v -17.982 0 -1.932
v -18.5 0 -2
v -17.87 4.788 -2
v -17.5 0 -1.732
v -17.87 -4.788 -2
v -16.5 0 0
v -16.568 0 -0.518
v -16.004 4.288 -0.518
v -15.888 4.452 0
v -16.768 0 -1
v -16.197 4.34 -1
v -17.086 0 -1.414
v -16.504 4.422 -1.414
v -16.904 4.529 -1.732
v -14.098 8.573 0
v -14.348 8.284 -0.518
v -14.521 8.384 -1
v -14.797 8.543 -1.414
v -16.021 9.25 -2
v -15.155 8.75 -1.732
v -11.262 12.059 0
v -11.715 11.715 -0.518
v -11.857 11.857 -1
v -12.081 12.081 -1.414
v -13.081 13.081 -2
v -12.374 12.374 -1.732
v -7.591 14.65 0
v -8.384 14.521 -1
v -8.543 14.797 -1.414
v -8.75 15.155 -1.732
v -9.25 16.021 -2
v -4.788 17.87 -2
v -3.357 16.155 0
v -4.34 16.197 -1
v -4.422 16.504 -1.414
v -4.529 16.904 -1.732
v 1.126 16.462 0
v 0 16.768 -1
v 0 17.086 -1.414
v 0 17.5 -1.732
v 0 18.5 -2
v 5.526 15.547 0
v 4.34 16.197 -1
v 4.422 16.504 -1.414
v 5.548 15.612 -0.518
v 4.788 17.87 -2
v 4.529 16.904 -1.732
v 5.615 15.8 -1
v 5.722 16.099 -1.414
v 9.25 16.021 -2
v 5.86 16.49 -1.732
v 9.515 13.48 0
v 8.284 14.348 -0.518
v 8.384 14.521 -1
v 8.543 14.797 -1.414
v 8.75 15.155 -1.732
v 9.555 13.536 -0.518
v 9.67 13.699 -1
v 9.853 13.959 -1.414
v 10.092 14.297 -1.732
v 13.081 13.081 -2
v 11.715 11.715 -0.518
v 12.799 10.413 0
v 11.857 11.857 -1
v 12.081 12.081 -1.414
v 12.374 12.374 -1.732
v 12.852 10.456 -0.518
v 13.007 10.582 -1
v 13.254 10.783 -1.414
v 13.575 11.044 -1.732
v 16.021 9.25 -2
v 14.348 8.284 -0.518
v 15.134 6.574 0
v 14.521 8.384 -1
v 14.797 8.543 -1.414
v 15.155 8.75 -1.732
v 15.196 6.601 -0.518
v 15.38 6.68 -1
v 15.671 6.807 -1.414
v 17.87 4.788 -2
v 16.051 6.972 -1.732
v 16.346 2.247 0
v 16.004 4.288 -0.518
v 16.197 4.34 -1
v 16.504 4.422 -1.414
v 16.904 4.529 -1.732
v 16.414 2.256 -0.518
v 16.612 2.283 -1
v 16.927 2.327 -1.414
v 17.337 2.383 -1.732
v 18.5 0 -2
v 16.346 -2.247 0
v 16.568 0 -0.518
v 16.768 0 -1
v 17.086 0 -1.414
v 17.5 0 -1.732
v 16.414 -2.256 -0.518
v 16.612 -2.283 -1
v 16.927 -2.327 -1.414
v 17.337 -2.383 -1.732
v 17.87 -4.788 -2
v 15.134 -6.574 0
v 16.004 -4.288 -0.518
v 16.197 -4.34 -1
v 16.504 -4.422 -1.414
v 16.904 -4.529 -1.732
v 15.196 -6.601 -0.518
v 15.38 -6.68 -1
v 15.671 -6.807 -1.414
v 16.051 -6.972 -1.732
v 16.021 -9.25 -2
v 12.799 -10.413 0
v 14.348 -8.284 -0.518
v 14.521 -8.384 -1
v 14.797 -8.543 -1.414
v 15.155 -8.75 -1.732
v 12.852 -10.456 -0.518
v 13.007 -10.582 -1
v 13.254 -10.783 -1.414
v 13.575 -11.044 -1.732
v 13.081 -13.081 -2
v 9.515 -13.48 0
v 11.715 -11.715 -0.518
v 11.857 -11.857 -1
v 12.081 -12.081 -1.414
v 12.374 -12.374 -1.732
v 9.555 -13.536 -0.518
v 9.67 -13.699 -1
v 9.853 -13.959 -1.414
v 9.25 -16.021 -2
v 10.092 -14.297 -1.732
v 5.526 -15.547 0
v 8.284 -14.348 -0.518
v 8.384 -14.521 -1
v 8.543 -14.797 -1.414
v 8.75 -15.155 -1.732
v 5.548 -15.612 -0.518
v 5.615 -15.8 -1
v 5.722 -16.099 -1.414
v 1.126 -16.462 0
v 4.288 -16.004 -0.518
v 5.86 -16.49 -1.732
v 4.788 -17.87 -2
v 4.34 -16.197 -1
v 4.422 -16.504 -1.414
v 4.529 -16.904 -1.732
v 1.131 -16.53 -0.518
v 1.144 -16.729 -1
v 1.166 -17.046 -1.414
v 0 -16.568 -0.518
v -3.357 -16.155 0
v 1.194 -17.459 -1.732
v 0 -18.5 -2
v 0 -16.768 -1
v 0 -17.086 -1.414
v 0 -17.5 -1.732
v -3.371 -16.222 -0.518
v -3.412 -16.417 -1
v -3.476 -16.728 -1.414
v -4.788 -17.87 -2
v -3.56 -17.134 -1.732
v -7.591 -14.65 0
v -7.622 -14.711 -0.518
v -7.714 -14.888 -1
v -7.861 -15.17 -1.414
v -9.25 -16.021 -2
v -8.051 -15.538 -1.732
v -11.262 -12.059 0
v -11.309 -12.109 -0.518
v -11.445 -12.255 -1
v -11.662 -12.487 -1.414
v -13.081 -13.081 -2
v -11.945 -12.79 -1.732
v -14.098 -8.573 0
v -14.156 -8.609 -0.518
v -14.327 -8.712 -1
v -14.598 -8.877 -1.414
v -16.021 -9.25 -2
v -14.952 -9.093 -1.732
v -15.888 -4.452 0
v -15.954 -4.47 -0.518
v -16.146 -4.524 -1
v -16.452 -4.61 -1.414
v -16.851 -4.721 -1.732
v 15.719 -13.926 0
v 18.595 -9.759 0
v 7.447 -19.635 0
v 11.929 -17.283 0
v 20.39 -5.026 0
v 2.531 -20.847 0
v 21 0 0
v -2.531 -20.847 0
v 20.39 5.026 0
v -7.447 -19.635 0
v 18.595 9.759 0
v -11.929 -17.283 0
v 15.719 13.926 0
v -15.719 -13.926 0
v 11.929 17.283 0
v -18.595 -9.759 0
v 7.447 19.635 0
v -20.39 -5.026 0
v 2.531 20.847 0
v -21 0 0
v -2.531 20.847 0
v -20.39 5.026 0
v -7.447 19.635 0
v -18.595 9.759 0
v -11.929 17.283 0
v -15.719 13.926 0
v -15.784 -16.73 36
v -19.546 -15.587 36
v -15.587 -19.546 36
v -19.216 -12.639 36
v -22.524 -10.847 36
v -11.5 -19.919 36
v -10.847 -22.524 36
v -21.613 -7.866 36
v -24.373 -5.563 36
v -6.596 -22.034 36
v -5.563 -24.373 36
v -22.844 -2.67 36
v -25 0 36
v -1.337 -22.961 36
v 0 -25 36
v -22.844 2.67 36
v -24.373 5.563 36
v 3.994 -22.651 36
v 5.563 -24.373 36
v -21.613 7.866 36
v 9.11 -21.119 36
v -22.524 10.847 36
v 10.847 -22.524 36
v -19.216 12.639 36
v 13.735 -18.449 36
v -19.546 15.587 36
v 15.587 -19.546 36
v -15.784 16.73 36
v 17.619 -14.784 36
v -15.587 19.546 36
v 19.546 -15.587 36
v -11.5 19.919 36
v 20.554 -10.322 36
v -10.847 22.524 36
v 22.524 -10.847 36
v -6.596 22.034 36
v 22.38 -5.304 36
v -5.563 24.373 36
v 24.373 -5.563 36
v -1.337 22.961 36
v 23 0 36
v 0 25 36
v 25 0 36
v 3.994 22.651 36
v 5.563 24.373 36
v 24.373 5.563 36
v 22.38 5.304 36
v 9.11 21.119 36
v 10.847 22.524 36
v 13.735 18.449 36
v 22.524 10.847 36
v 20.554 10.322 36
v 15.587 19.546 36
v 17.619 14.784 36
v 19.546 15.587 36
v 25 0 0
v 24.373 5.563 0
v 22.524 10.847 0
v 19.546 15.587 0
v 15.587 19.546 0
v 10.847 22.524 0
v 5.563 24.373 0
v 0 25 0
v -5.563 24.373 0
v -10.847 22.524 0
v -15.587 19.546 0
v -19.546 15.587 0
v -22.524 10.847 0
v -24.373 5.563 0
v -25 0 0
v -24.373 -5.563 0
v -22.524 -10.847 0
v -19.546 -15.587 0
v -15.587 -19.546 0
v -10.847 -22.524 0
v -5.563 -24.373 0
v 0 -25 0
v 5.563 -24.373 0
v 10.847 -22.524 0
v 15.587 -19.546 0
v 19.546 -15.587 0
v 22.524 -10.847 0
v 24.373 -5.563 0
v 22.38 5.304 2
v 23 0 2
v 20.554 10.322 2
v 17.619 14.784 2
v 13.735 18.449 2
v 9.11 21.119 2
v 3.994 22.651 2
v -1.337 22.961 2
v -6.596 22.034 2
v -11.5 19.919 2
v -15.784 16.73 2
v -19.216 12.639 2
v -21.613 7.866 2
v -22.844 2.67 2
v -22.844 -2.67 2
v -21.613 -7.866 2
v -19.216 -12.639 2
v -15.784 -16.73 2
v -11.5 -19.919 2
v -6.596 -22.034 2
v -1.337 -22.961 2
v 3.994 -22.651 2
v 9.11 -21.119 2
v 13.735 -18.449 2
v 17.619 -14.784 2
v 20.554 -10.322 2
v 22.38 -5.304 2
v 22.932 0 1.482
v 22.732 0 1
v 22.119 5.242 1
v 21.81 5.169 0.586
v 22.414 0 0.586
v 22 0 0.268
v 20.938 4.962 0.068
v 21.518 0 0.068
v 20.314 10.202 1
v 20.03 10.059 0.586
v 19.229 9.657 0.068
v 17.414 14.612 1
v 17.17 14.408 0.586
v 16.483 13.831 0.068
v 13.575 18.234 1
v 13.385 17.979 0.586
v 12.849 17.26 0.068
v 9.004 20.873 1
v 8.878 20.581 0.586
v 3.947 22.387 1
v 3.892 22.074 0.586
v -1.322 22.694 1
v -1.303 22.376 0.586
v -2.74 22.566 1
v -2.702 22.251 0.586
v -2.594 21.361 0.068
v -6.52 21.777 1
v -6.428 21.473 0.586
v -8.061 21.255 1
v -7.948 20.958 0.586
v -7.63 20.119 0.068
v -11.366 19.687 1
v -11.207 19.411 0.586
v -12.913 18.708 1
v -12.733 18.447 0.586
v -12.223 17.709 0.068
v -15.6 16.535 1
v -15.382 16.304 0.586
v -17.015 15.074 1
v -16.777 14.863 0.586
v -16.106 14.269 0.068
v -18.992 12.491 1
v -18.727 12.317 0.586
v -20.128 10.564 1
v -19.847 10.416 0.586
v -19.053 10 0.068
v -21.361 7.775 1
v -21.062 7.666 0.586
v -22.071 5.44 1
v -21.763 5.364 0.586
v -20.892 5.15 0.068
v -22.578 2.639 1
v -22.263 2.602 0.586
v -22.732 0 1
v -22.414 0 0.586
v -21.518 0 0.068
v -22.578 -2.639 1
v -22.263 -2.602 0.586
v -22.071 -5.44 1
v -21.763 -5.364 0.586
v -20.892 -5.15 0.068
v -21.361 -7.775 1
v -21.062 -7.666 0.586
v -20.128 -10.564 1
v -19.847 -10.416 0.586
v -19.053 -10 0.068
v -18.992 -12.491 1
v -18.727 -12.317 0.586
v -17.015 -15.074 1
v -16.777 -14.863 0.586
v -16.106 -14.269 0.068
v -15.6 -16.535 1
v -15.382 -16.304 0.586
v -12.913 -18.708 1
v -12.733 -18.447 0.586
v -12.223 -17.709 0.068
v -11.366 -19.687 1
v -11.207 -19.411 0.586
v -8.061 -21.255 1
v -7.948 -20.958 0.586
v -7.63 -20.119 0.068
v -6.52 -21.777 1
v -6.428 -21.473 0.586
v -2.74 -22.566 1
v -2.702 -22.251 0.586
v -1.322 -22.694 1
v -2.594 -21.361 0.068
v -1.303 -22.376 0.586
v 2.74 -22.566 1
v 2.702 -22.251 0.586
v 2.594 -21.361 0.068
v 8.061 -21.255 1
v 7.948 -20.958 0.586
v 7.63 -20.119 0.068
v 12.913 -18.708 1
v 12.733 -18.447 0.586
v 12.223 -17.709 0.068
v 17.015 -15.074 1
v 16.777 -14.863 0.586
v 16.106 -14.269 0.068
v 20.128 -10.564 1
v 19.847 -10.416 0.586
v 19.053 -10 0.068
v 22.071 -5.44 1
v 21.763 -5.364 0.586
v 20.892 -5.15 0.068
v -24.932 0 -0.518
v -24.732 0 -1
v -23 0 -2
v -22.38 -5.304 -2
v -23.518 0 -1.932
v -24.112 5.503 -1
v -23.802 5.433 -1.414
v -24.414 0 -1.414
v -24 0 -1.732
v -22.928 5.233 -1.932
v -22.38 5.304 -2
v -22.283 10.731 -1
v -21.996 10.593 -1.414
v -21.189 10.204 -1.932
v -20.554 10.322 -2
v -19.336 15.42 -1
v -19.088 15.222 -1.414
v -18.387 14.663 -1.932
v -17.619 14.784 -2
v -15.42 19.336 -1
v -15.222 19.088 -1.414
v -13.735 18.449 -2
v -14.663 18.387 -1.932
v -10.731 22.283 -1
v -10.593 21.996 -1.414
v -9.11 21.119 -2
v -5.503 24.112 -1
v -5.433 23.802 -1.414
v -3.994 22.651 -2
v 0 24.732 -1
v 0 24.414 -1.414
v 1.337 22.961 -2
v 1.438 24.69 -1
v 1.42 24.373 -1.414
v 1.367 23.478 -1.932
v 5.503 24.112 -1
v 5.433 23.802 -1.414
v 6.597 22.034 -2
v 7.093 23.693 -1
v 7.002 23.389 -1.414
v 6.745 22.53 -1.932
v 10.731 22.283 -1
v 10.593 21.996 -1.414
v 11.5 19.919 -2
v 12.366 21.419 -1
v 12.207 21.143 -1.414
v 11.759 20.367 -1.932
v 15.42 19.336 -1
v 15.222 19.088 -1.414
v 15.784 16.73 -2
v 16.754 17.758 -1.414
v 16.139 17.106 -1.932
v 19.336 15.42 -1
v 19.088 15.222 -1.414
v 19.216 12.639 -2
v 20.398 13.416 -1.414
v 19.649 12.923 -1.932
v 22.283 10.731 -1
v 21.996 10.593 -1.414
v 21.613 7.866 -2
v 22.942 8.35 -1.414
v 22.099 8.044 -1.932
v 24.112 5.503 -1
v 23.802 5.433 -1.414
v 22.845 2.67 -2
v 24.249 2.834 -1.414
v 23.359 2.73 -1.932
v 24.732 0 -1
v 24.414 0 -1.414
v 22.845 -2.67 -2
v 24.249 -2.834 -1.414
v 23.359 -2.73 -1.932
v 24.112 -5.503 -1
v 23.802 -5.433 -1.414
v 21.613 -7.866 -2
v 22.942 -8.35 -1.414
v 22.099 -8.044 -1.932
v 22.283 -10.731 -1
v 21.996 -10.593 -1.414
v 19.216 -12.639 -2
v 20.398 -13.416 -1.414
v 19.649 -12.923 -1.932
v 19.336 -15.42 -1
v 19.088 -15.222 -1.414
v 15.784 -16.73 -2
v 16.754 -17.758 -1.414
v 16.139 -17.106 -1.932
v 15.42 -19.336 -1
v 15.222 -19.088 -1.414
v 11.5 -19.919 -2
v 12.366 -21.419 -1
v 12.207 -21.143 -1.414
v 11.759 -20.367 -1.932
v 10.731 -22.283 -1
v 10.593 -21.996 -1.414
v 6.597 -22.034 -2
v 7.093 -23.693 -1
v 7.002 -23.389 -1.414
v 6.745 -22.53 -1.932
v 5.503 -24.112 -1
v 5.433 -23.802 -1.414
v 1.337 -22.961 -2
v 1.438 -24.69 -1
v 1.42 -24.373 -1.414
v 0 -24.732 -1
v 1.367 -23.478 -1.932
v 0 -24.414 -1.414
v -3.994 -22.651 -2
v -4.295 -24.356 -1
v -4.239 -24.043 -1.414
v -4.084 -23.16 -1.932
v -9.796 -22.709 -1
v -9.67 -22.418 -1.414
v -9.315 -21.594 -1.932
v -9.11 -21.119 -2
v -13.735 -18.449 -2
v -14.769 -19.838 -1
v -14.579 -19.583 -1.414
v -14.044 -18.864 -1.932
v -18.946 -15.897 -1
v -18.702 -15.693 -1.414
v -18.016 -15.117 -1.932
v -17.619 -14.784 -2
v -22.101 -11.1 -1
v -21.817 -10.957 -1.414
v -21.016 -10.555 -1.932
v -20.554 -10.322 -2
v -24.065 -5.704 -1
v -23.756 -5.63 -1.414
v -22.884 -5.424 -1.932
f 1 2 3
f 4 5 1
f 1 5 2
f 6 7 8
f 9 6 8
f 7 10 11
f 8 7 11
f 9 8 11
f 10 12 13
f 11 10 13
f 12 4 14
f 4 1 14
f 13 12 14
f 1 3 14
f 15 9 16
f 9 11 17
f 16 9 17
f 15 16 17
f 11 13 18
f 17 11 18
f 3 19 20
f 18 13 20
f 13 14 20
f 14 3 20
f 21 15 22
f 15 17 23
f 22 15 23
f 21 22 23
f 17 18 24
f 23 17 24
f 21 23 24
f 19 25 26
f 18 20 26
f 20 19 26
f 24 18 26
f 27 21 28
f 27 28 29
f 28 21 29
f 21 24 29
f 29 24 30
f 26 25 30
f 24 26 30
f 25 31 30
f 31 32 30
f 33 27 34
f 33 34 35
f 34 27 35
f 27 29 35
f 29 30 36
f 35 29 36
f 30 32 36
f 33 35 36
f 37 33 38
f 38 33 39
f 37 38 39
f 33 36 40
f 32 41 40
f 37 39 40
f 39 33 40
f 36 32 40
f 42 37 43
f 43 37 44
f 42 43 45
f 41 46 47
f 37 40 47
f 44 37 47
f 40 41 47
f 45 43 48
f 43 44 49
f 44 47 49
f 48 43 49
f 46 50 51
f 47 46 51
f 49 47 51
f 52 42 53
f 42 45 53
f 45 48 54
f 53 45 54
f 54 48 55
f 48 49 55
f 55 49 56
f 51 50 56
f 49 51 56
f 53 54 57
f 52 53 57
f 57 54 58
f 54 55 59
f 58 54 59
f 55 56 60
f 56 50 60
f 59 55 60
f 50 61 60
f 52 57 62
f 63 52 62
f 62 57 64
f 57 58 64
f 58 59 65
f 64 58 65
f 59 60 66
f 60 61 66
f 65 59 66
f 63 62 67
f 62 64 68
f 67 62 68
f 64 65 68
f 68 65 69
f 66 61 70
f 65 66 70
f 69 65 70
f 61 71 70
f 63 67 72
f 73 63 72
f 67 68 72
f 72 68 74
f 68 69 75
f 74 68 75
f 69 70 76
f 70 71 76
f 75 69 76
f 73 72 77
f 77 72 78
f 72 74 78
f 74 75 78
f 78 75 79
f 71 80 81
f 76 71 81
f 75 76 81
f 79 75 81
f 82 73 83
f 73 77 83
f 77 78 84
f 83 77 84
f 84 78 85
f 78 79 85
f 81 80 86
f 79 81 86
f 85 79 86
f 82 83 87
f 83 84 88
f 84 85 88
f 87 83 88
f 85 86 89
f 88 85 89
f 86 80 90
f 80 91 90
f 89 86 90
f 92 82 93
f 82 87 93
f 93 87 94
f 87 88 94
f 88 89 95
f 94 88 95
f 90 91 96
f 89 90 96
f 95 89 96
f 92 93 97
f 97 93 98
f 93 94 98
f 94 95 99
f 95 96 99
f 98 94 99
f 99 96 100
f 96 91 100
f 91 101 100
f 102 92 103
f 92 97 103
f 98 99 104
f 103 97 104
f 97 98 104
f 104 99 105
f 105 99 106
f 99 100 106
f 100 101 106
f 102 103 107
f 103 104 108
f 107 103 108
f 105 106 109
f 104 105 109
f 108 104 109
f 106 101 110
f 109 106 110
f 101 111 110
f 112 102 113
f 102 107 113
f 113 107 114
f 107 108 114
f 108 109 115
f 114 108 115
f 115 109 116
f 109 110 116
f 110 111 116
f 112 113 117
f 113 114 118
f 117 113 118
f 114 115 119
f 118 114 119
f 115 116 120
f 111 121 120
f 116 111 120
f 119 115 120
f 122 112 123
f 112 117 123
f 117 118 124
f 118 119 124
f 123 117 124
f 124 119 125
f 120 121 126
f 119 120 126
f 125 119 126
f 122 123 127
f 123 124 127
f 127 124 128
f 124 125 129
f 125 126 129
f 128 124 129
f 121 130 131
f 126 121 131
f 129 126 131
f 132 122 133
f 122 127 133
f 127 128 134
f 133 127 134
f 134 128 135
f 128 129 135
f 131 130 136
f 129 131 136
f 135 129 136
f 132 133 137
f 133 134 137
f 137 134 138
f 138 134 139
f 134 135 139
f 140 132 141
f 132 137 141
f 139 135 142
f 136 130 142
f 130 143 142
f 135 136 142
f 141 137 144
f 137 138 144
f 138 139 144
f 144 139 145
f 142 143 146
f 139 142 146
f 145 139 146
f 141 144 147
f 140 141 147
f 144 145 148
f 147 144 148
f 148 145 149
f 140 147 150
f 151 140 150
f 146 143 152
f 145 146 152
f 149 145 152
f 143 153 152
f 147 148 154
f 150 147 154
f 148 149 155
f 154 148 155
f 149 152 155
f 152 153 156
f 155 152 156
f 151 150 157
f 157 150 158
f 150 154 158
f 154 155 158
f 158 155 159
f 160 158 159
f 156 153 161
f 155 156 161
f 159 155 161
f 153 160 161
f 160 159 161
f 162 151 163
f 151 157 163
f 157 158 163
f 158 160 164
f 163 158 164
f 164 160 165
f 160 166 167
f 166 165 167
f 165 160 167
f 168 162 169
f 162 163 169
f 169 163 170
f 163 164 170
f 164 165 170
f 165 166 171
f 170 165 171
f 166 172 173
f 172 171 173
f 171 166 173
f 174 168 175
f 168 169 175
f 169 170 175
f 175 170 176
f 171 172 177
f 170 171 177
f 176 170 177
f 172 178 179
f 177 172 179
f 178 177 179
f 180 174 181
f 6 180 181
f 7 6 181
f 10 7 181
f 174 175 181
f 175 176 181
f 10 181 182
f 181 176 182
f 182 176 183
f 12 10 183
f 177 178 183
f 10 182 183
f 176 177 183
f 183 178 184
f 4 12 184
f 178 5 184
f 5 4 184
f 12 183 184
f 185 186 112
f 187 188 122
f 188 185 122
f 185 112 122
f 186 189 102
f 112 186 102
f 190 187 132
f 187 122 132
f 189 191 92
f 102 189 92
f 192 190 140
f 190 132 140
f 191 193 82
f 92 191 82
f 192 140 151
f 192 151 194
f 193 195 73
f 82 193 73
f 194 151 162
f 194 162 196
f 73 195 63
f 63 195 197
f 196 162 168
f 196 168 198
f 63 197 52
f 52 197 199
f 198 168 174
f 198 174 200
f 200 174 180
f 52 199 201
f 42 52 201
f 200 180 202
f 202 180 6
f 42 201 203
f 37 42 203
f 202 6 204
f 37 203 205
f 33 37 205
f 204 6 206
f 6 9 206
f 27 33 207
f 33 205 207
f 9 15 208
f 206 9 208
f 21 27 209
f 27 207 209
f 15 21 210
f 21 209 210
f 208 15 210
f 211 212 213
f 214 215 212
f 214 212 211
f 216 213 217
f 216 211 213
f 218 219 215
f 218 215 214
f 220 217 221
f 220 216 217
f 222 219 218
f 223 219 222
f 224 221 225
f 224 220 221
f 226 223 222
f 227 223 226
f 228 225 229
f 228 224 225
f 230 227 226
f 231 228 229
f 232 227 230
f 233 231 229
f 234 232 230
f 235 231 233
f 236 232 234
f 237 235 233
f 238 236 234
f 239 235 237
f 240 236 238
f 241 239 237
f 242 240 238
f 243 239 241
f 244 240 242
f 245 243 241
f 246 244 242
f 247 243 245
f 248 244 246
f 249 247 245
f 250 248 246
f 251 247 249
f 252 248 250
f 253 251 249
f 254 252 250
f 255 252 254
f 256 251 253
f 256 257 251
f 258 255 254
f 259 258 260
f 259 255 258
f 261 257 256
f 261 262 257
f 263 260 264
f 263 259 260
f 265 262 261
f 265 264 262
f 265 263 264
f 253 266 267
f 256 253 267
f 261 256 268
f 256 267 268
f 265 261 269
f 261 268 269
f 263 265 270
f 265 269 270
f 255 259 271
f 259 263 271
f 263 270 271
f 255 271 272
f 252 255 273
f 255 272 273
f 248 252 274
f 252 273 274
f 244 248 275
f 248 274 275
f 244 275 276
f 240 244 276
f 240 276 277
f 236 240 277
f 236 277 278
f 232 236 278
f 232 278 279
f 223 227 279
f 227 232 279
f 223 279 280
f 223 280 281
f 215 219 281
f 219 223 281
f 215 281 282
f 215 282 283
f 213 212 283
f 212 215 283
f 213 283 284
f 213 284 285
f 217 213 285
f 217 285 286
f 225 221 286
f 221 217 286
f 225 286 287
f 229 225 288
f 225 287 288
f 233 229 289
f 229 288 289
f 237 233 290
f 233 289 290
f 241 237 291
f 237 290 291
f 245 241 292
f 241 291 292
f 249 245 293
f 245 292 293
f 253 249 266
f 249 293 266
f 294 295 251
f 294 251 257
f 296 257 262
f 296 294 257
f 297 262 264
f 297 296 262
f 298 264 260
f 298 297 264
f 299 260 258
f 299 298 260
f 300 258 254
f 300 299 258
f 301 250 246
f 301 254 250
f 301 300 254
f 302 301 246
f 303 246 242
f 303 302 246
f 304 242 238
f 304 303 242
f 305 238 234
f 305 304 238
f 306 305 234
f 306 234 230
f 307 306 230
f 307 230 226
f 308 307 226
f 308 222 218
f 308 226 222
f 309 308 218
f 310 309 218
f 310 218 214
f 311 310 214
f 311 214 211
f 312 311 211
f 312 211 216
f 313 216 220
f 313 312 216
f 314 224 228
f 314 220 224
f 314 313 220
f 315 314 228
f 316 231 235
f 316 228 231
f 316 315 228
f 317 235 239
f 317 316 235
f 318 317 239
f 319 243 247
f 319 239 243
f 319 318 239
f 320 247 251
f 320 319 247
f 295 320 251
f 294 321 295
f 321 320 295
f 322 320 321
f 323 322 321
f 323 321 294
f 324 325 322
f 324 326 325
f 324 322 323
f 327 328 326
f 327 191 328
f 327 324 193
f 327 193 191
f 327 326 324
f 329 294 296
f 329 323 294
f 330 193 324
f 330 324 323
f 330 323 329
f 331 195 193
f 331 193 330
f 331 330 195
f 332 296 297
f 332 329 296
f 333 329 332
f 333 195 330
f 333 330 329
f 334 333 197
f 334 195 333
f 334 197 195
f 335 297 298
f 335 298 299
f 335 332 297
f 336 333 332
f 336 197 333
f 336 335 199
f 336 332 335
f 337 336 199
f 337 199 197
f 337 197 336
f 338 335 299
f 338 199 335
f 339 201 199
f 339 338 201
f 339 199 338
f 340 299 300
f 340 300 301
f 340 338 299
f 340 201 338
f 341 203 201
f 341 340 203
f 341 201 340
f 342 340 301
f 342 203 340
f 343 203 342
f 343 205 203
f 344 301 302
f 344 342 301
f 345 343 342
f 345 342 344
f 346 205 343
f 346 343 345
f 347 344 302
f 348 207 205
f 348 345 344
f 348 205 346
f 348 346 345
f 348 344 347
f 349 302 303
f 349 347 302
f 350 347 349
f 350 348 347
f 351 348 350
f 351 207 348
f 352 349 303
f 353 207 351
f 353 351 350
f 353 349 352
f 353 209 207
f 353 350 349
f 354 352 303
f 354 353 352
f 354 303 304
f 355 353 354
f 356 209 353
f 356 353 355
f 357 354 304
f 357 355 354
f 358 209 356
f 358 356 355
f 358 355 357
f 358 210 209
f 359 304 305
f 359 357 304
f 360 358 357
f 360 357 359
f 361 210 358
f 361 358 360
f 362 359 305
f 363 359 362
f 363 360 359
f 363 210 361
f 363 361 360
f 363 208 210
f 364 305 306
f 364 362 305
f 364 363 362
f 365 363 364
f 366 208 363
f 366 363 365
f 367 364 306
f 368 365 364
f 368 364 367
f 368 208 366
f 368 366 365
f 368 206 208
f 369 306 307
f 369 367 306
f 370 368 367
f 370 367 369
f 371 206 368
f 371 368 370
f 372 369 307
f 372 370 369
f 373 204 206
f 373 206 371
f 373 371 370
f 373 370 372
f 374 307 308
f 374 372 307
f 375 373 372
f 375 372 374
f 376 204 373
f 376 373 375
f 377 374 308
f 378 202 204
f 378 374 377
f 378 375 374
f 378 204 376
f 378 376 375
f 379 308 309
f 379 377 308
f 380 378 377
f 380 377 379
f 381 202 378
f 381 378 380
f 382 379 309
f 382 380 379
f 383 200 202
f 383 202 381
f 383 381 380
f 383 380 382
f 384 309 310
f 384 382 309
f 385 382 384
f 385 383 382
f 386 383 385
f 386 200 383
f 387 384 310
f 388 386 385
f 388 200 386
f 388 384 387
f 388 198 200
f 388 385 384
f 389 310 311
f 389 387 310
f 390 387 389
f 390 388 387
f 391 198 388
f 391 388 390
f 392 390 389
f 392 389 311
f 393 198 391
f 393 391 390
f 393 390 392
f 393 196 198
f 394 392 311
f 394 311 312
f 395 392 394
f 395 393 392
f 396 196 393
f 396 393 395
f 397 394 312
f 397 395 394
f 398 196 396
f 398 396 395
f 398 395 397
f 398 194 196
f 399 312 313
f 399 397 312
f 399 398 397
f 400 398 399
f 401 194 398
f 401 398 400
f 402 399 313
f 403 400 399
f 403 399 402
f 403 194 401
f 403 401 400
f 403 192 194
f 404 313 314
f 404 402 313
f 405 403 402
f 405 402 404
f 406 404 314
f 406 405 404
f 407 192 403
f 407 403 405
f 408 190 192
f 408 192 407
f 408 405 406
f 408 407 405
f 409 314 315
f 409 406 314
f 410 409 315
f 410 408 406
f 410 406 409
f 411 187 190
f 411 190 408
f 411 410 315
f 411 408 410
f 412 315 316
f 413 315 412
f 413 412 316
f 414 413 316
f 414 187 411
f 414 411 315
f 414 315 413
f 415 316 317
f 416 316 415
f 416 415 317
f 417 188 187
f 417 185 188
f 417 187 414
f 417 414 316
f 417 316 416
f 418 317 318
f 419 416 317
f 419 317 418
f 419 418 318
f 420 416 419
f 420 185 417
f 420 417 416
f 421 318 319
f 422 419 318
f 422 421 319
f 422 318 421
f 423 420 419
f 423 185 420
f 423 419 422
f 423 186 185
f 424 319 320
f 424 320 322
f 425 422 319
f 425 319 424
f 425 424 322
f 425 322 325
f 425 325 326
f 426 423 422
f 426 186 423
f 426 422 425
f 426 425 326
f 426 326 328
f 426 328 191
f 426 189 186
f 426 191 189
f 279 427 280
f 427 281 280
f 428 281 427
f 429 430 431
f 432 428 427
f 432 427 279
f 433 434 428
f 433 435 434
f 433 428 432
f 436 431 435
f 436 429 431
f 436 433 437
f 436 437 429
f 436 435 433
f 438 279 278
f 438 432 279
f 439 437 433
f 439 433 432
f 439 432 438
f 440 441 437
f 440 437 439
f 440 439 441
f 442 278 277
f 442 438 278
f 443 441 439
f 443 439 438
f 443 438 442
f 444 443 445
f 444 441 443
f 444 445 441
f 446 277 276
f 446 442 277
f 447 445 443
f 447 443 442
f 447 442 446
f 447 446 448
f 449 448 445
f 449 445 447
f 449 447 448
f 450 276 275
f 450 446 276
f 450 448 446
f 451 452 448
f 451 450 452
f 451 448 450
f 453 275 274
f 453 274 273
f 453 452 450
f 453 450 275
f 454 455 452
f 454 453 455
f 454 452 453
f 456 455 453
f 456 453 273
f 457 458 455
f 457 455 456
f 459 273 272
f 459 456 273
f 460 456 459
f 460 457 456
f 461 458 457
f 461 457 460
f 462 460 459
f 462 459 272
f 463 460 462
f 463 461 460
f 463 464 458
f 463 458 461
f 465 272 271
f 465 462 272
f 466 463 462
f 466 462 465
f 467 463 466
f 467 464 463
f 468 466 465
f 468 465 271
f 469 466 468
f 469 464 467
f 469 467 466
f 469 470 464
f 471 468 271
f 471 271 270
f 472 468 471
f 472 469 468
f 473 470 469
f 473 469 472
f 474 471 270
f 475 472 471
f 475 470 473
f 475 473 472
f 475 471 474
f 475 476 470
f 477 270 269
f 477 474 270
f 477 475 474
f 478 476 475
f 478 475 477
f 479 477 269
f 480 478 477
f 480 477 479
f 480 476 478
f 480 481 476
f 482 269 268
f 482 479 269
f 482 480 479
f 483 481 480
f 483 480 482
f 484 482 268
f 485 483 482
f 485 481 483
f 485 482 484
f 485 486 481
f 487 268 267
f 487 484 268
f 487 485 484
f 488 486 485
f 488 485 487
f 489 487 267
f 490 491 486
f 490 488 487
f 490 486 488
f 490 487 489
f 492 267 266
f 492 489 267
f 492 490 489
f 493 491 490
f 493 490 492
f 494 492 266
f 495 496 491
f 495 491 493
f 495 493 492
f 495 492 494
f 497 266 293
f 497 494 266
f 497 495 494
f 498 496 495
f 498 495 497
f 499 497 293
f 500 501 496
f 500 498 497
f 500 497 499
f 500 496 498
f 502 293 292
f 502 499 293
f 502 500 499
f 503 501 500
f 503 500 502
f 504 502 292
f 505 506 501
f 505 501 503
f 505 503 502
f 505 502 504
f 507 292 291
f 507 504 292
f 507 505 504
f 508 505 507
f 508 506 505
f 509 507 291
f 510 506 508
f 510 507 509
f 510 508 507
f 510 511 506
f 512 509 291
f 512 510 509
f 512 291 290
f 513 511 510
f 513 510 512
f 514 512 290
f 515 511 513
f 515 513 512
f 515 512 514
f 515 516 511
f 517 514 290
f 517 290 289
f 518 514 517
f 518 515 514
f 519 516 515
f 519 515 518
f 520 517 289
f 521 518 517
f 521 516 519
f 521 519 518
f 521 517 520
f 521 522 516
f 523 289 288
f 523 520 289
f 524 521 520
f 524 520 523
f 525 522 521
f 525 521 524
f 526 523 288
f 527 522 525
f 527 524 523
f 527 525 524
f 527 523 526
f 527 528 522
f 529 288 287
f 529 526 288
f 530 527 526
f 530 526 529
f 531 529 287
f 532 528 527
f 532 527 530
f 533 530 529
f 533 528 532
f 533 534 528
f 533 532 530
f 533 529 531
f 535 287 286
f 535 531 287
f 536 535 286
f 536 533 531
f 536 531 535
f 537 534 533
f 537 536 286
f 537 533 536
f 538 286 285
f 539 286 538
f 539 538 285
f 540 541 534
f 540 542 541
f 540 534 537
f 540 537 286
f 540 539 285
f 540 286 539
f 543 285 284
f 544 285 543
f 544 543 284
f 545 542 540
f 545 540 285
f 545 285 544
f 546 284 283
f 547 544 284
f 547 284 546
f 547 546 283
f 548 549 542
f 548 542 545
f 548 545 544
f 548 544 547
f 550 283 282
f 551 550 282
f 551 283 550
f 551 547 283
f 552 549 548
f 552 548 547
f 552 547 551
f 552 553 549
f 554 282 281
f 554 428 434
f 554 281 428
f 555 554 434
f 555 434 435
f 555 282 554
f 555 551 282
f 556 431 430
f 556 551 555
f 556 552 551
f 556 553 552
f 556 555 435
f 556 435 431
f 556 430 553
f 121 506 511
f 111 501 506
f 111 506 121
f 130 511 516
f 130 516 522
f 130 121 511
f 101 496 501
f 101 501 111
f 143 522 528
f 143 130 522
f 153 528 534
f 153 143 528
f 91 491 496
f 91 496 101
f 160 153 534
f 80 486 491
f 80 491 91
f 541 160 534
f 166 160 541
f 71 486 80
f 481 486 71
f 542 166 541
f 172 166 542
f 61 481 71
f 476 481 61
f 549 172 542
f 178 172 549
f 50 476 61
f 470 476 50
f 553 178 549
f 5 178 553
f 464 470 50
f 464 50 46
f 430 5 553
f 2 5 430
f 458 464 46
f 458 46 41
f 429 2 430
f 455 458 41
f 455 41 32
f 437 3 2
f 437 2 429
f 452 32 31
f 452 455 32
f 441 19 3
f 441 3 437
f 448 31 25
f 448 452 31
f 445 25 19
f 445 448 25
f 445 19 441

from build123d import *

# Parameters (mm, degrees)
SKETCH_1_R          = 25
SKETCH_1_R_2        = 23
EXTRUDE_1_DEPTH     = 40
EXTRUDE_START       = 2
SKETCH_2_R          = 25
EXTRUDE_2_DEPTH     = 2
SKETCH_3_R          = 16.5
CUT_EXTRUDE_1_DEPTH = 2
FILLET_1_R          = 2
FILLET_2_R          = 2
FILLET_3_R          = 2
SKETCH_4_W          = 61.708706265
SKETCH_4_H          = 81.66323808
CUT_EXTRUDE_2_DEPTH = 4


with BuildPart() as part:
    # 草图1 → 凸台-拉伸1 (new body)
    with BuildSketch(Plane.XY):
        Circle(SKETCH_1_R)
        Circle(SKETCH_1_R_2, mode=Mode.SUBTRACT)
    extrude(amount=EXTRUDE_1_DEPTH)

    # 草图2 → 凸台-拉伸2 (add)
    with BuildSketch(Plane(origin=(0, 0, 0), x_dir=(-1, 0, 0), z_dir=(0, 0, -1)).offset(EXTRUDE_START)):
        Circle(SKETCH_2_R)
    extrude(amount=-EXTRUDE_2_DEPTH)

    # 草图3 → 切除-拉伸1 (cut)
    with BuildSketch(Plane(origin=(0, 0, -2), x_dir=(-1, 0, 0), z_dir=(0, 0, -1))):
        Circle(SKETCH_3_R)
    extrude(amount=-CUT_EXTRUDE_1_DEPTH, mode=Mode.SUBTRACT)

    # 圆角1
    fillet_1_edges = [part.edges().sort_by_distance(p)[0] for p in [
        (25, 0, -2),
    ]]
    fillet(fillet_1_edges, radius=FILLET_1_R - 0.0001)  # a hair under: the kernel refuses the full size

    # 圆角2
    fillet_2_edges = [part.edges().sort_by_distance(p)[0] for p in [
        (-23, 0, 0),
    ]]
    fillet(fillet_2_edges, radius=FILLET_2_R)

    # 圆角3
    fillet_3_edges = [part.edges().sort_by_distance(p)[0] for p in [
        (16.5, 0, -2),
    ]]
    fillet(fillet_3_edges, radius=FILLET_3_R - 0.0001)  # a hair under: the kernel refuses the full size

    # 草图4 → 切除-拉伸2 (cut)
    with BuildSketch(Plane.XY.offset(40)):
        with Locations((-0.068337437, -3.724390356)):
            Rectangle(SKETCH_4_W, SKETCH_4_H)
    extrude(amount=-CUT_EXTRUDE_2_DEPTH, mode=Mode.SUBTRACT)


solid = part.part
